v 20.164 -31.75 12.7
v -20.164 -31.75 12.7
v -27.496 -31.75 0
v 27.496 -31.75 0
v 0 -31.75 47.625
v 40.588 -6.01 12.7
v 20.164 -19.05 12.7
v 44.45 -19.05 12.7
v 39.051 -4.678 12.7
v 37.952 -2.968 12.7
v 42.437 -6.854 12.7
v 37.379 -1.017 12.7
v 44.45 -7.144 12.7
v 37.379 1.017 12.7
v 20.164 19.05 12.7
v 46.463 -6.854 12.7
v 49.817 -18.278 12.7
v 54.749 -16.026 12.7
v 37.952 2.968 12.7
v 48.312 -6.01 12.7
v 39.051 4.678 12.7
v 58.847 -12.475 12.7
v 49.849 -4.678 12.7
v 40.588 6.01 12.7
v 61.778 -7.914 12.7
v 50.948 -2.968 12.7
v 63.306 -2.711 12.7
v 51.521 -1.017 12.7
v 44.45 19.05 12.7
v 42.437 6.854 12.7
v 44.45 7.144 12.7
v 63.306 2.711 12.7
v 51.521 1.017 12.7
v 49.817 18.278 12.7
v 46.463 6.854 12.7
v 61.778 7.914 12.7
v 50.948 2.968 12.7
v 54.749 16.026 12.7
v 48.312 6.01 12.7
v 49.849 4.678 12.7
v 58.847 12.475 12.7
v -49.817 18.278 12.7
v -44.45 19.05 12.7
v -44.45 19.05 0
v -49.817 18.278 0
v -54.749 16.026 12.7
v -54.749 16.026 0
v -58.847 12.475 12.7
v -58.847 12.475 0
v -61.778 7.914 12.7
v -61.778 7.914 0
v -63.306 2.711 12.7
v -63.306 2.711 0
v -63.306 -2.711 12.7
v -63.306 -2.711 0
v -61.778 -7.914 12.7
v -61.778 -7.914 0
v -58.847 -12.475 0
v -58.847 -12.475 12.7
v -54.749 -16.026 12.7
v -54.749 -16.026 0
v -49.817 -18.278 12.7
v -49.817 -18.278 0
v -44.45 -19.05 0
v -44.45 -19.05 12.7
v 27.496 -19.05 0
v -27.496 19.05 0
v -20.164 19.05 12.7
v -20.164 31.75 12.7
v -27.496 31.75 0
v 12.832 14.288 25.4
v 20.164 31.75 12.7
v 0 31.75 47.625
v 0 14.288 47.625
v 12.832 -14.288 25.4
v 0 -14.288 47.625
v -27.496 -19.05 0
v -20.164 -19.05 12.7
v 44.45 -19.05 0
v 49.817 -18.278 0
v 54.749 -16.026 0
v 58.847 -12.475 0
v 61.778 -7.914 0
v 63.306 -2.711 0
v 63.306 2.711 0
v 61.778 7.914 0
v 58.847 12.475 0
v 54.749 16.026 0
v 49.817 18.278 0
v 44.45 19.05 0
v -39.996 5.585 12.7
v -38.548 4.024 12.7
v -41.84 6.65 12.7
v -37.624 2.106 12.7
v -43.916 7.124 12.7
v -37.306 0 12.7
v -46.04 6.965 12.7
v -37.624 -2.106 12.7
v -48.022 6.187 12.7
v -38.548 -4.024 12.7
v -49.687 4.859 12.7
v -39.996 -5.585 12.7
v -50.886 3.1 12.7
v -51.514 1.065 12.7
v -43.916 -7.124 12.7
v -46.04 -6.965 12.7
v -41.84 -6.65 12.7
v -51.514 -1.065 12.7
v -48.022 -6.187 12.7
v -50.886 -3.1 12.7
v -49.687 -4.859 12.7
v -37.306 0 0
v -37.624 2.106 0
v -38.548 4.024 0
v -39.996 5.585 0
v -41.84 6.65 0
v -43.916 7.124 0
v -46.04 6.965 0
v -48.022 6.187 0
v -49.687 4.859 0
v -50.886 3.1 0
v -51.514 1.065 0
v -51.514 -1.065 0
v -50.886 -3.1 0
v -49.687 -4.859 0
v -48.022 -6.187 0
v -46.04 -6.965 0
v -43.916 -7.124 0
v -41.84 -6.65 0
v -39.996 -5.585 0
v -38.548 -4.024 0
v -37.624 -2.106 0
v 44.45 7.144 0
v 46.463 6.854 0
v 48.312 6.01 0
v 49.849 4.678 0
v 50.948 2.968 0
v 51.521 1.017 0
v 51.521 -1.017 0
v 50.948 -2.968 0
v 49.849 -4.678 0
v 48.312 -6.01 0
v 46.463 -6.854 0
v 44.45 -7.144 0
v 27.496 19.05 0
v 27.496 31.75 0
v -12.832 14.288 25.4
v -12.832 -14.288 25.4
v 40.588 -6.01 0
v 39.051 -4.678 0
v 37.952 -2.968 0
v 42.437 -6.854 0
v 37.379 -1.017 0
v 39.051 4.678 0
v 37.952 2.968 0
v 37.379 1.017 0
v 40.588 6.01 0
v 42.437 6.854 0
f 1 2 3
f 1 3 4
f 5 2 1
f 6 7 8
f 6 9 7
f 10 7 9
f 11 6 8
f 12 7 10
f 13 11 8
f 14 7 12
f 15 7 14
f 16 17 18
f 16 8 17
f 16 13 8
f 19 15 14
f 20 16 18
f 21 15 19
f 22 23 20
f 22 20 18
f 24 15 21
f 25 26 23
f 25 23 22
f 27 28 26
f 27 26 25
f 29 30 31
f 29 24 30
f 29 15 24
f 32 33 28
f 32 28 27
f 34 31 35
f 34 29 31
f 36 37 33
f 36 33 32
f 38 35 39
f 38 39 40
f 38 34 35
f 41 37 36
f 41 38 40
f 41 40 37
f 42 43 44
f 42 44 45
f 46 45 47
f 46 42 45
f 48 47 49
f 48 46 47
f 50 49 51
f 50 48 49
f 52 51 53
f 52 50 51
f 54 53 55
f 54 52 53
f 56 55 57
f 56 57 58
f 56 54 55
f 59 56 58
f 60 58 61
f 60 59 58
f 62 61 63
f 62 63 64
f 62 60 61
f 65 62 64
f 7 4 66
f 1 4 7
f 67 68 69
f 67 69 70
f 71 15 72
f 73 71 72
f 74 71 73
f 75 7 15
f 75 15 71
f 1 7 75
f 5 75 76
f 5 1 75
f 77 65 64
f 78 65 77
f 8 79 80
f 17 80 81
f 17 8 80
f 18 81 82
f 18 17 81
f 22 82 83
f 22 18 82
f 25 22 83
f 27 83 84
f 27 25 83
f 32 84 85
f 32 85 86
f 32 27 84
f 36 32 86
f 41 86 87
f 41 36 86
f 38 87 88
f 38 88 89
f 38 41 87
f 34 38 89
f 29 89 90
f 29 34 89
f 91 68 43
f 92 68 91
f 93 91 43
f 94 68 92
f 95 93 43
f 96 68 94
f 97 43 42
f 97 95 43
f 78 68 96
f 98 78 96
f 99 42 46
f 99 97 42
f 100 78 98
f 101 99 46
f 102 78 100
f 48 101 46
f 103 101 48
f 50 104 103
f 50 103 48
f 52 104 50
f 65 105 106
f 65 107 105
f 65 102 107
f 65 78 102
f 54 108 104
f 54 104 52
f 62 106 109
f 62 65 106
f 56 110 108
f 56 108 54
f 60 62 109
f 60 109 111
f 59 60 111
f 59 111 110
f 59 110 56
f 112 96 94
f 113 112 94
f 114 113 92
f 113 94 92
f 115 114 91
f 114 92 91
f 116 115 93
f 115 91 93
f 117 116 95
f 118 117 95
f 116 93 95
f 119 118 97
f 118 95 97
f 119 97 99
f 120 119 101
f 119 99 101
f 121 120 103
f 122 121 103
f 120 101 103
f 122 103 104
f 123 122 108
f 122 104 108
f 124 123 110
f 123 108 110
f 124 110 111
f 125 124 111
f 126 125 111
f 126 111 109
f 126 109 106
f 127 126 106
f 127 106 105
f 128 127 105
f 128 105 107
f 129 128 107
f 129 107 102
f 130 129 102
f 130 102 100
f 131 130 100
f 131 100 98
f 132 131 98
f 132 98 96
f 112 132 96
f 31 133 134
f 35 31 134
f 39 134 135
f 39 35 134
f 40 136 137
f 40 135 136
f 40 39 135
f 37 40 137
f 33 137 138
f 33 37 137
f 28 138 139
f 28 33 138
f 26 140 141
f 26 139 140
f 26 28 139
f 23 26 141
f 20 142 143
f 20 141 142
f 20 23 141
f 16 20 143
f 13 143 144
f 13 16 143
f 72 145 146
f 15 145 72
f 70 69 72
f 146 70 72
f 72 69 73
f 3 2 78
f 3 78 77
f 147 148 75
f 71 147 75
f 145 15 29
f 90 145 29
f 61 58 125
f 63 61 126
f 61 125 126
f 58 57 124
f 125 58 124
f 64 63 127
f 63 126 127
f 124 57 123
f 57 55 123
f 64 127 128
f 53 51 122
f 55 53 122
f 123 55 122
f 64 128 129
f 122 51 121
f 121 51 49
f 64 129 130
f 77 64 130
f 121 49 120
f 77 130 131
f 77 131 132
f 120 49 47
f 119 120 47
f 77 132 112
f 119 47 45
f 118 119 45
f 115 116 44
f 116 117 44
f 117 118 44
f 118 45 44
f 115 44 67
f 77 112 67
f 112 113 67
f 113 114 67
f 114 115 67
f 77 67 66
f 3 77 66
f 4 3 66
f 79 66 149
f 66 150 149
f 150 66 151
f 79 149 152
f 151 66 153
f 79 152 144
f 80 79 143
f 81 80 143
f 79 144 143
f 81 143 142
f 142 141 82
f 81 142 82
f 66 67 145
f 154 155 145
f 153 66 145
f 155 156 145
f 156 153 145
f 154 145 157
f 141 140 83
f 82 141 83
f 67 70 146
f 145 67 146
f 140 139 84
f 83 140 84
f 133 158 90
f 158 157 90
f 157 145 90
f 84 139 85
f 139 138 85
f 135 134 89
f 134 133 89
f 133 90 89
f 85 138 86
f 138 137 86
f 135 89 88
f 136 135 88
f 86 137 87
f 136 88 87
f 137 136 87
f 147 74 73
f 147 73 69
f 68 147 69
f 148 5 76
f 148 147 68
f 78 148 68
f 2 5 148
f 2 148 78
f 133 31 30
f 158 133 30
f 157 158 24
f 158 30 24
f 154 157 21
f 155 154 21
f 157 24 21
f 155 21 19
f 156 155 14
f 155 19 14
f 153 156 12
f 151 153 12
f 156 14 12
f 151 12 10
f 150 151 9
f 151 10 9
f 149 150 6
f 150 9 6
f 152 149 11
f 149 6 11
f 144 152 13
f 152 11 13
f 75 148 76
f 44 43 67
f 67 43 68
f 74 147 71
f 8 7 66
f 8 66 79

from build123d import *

# Parameters (mm, degrees)
F1_DEPTH = 31.75
F2_DEPTH = 19.05
F5_DEPTH = 12.7
F6_DEPTH = 25.4
F7_DEPTH = 25.4
F8_W     = 40.1893556118
F8_H     = 22.225
F8_W_2   = 32.2620980442
F9_DEPTH = 14.2875


with BuildPart() as f1:
    # F0 (on Front) → F1 (new body, symmetric)
    with BuildSketch(Plane.XZ):
        Polygon((0, 47.625), (0, 12.7), (20.1639581514, 12.7), align=None)
        Polygon((-27.4963065702, 0), (0, 0), (0, 12.7), (-20.1639581514, 12.7), align=None)
        Polygon((0, 12.7), (0, 0), (27.4963065702, 0), (20.1639581514, 12.7), align=None)
        Polygon((-20.1639581514, 12.7), (0, 12.7), (0, 47.625), align=None)
    extrude(amount=F1_DEPTH, both=True)

    # F0 (on Front) → F2 (join, symmetric)
    with BuildSketch(Plane.XZ):
        Polygon((-27.4963065702, 0), (0, 0), (0, 12.7), (-20.1639581514, 12.7), align=None)
        Polygon((0, 12.7), (0, 0), (27.4963065702, 0), (20.1639581514, 12.7), align=None)
        Polygon((-20.1639581514, 12.7), (0, 12.7), (0, 47.625), align=None)
        Polygon((0, 47.625), (0, 12.7), (20.1639581514, 12.7), align=None)
        Polygon((-44.45, 0), (-27.4963065702, 0), (-20.1639581514, 12.7), (-44.45, 12.7), align=None)
        Polygon((20.1639581514, 12.7), (27.4963065702, 0), (44.45, 0), (44.45, 12.7), align=None)
    extrude(amount=F2_DEPTH, both=True)

    # F4 (on face) + F3 (on face) → F5 (join, through all)
    with BuildSketch(Plane.XY.offset(12.7)):
        with BuildLine():
            ThreePointArc((44.45, -19.05), (57.9203841816, -13.4703841816), (63.5, 0))
            ThreePointArc((63.5, 0), (57.9203841816, 13.4703841816), (44.45, 19.05))
            Line((44.45, 19.05), (44.45, 7.14375))
            ThreePointArc((44.45, 7.14375), (49.5013940681, 5.0513940681), (51.59375, 0))
            ThreePointArc((51.59375, 0), (49.5013940681, -5.0513940681), (44.45, -7.14375))
            Line((44.45, -7.14375), (44.45, -19.05))
        make_face()
        with BuildLine():
            Line((44.45, 7.14375), (44.45, 19.05))
            ThreePointArc((44.45, 19.05), (25.4, 0), (44.45, -19.05))
            Line((44.45, -19.05), (44.45, -7.14375))
            ThreePointArc((44.45, -7.14375), (37.30625, 0), (44.45, 7.14375))
        make_face()
    with BuildSketch(Plane.XY.offset(12.7)):
        with BuildLine():
            ThreePointArc((-44.45, -19.05), (-30.9796158184, -13.4703841816), (-25.4, 0))
            ThreePointArc((-25.4, 0), (-30.9796158184, 13.4703841816), (-44.45, 19.05))
            Line((-44.45, 19.05), (-44.45, 7.14375))
            ThreePointArc((-44.45, 7.14375), (-39.3986059319, 5.0513940681), (-37.30625, 0))
            ThreePointArc((-37.30625, 0), (-39.3986059319, -5.0513940681), (-44.45, -7.14375))
            Line((-44.45, -7.14375), (-44.45, -19.05))
        make_face()
        with BuildLine():
            Line((-44.45, 7.14375), (-44.45, 19.05))
            ThreePointArc((-44.45, 19.05), (-63.5, 0), (-44.45, -19.05))
            Line((-44.45, -19.05), (-44.45, -7.14375))
            ThreePointArc((-44.45, -7.14375), (-51.59375, 0), (-44.45, 7.14375))
        make_face()
    extrude(amount=-F5_DEPTH)

    # F3 (on face) → F6 (cut)
    with BuildSketch(Plane.XY.offset(12.7)):
        with BuildLine():
            ThreePointArc((-37.30625, 0), (-39.3986059319, 5.0513940681), (-44.45, 7.14375))
            Line((-44.45, 7.14375), (-44.45, -7.14375))
            ThreePointArc((-44.45, -7.14375), (-39.3986059319, -5.0513940681), (-37.30625, 0))
        make_face()
        with BuildLine():
            Line((-44.45, -7.14375), (-44.45, 7.14375))
            ThreePointArc((-44.45, 7.14375), (-51.59375, 0), (-44.45, -7.14375))
        make_face()
    extrude(amount=-F6_DEPTH, mode=Mode.SUBTRACT)

    # F4 (on face) → F7 (cut)
    with BuildSketch(Plane.XY.offset(12.7)):
        with BuildLine():
            Line((44.45, -7.14375), (44.45, 7.14375))
            ThreePointArc((44.45, 7.14375), (37.30625, 0), (44.45, -7.14375))
        make_face()
    extrude(amount=-F7_DEPTH, mode=Mode.SUBTRACT)

    # F8 (on Front) → F9 (cut, symmetric)
    with BuildSketch(Plane.XZ):
        with Locations((-20.0946778059, 36.5125)):
            Rectangle(F8_W, F8_H)
        with Locations((16.1310490221, 36.5125)):
            Rectangle(F8_W_2, F8_H)
    extrude(amount=F9_DEPTH, both=True, mode=Mode.SUBTRACT)


solid = f1.part
